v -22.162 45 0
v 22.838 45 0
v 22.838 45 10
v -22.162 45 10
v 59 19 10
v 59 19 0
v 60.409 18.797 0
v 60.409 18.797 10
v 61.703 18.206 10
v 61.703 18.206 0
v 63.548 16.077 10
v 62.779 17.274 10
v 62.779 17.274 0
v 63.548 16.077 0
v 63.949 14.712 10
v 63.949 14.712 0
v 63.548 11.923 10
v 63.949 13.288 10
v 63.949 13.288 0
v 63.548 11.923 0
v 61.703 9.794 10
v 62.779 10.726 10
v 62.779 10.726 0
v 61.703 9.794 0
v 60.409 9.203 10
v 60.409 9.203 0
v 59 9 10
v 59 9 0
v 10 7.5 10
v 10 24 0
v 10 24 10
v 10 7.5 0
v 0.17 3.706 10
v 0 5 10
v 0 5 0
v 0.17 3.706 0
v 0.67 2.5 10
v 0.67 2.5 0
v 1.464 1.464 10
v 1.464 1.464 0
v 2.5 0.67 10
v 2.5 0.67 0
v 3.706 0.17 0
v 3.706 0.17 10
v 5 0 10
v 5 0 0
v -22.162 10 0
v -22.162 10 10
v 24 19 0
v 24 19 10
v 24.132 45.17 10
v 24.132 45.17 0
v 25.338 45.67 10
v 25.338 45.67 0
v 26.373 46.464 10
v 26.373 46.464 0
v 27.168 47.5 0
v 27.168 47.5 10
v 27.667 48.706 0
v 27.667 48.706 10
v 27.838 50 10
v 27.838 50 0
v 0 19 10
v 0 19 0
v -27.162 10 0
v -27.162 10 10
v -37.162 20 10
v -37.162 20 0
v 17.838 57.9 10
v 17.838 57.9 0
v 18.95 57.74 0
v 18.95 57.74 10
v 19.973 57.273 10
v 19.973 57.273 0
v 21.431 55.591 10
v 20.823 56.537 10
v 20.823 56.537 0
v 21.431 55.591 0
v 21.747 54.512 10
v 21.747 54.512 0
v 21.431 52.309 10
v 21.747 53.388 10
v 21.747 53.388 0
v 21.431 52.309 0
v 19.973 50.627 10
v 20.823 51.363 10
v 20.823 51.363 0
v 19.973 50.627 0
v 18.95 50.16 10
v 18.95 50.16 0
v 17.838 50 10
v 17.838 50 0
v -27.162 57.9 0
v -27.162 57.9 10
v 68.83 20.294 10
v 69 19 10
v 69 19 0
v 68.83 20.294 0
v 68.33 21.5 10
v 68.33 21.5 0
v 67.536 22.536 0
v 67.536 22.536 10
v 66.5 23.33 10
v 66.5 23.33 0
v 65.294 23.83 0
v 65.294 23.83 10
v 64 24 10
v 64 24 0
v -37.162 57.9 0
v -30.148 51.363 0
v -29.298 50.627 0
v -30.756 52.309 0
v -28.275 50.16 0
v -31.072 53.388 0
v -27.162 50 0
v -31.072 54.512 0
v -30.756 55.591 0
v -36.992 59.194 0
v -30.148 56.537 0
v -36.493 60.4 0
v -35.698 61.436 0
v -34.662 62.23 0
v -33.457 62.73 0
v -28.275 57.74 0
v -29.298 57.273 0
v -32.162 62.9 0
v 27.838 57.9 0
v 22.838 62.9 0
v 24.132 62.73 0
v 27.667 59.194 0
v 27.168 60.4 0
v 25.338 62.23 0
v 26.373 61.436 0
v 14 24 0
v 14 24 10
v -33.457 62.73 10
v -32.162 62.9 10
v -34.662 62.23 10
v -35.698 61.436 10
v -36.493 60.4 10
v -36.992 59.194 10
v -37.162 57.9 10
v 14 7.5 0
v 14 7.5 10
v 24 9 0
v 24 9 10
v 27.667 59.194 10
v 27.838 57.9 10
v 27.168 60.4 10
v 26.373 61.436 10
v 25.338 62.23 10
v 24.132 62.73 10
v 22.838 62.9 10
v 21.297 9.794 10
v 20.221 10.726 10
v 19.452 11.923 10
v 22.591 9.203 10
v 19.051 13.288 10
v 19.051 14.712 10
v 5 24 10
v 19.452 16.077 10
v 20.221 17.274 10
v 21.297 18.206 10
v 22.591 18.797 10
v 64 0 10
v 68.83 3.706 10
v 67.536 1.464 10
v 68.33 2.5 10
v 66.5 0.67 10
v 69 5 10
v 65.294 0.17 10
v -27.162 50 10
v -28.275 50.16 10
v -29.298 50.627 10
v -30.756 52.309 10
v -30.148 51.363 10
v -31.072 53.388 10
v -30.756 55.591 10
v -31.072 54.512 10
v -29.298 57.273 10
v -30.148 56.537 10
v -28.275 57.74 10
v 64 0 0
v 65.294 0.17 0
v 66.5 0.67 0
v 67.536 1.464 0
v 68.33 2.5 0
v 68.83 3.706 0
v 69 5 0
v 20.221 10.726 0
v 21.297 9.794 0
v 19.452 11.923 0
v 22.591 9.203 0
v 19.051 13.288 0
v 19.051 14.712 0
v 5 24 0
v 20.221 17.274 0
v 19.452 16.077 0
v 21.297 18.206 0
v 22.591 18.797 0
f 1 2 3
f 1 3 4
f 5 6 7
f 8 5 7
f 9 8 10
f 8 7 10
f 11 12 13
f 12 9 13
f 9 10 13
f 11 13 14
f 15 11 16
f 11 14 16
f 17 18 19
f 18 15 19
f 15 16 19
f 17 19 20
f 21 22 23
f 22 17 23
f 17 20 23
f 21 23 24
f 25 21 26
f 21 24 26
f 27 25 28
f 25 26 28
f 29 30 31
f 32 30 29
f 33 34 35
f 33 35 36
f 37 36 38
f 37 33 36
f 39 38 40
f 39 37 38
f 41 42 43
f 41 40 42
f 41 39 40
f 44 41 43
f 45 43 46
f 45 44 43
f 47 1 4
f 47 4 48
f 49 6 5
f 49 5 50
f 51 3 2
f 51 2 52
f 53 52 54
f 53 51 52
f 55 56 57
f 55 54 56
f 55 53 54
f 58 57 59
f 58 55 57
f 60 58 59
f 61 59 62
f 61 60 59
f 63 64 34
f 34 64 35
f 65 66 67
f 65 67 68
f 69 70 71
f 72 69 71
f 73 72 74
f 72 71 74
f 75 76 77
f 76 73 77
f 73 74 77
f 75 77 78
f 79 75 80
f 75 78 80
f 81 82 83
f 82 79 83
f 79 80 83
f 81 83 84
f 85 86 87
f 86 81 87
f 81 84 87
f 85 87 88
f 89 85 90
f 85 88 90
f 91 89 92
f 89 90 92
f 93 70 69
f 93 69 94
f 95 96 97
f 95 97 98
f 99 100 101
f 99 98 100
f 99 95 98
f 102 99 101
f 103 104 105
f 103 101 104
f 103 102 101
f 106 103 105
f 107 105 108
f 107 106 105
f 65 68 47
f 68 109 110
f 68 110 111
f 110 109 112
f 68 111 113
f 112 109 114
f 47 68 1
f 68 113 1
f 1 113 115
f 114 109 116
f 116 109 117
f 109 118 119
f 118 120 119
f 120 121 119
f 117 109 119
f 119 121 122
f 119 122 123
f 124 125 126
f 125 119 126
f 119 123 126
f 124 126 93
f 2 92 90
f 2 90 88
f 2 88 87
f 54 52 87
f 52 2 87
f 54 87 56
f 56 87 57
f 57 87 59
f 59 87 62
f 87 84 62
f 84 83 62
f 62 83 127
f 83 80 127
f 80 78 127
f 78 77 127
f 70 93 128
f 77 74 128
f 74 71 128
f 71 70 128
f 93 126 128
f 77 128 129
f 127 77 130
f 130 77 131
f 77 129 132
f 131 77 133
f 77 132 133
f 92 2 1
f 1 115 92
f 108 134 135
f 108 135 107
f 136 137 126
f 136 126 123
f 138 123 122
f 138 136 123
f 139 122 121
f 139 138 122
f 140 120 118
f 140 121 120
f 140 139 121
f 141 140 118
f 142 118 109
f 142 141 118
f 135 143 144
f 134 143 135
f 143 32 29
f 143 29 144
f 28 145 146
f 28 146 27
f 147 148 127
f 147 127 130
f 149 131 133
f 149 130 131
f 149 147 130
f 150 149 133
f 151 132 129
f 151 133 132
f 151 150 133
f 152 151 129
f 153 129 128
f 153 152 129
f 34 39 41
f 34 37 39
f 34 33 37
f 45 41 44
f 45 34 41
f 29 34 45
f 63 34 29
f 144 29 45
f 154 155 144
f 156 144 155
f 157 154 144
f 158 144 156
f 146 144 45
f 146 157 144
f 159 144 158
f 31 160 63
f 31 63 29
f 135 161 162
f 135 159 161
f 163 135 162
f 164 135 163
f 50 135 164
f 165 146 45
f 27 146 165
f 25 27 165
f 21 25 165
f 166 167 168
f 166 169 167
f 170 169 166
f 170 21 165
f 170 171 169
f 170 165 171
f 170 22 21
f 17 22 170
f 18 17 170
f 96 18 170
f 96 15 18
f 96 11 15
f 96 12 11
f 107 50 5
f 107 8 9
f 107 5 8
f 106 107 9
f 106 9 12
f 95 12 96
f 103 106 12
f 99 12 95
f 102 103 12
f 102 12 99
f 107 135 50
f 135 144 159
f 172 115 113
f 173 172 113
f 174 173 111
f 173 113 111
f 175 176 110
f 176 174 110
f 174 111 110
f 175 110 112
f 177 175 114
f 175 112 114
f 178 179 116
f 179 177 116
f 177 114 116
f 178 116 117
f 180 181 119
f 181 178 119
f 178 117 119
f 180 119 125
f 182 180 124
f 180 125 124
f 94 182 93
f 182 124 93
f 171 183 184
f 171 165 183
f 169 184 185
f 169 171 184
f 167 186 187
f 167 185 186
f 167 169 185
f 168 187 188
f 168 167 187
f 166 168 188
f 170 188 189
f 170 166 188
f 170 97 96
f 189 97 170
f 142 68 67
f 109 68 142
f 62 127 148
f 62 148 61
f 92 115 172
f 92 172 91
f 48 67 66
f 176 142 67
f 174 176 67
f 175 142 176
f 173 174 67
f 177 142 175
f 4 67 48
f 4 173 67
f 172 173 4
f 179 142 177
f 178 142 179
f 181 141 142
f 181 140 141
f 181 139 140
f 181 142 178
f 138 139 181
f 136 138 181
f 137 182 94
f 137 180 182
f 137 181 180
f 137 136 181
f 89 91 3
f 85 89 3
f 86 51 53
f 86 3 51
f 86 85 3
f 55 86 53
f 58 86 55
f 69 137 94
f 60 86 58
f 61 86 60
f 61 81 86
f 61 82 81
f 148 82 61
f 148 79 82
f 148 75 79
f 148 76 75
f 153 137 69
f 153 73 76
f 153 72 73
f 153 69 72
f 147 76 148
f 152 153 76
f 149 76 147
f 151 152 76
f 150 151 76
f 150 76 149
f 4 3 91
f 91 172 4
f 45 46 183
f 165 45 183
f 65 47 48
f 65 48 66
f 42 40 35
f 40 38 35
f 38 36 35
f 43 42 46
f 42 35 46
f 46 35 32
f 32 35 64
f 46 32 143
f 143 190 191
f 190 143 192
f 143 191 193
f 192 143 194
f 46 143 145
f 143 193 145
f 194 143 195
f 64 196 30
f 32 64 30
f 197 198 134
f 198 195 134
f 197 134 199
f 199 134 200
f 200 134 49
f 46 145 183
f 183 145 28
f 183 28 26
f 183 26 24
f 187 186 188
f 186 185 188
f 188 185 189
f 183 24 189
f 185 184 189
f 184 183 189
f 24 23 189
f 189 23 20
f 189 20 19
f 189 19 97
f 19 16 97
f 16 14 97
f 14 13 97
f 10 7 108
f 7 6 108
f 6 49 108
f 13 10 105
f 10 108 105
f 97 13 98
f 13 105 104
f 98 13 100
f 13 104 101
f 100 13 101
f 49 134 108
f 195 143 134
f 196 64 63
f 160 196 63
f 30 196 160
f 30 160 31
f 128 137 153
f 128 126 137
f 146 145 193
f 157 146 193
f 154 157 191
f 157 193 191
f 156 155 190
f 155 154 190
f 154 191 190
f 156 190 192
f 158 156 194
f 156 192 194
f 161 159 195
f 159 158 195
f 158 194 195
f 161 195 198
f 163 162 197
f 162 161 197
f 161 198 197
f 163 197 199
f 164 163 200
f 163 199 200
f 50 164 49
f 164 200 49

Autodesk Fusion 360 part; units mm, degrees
sketch "back" plane through (0, 0, 0) normal (0, 0, 1) x (1, 0, 0)
  line L0 (-37.1625, 9.7554) -> (-37.1625, 62.9)
  line L1 (-37.1625, 62.9) -> (27.8375, 62.9)
  line L2 (27.8375, 62.9) -> (27.8375, 45)
  line L3 (27.8375, 45) -> (-22.1625, 45)
  line L4 (-22.1625, 45) -> (-22.1625, 10)
  line L5 (-22.1625, 10) -> (-37.1625, 10)
  line L6 (-37.1625, 10) -> (-37.1625, 9.7554)
  line L7 (27.8375, 53.95) -> (-37.1625, 53.95) construction
  line L8 (17.8375, 62.9) -> (17.8375, 53.95)
  line L9 (-27.1625, 62.9) -> (-27.1625, 53.95)
  line L10 (-27.1625, 50) -> (17.8375, 50)
  arc A0 (17.8375, 50) -> (17.8375, 57.9) centre (17.8375, 53.95) ccw
  line L11 (17.8375, 57.9) -> (-27.1625, 57.9)
  arc A1 (-27.1625, 57.9) -> (-27.1625, 50) centre (-27.1625, 53.95) ccw
  line L12 (-27.1625, 53.95) -> (17.8375, 53.95) construction
  line L13 (0, 0) -> (-32, 0) construction
  line L14 (0, 0) -> (0, 18) construction
  line L15 (-22.1625, 45) -> (-37.1625, 45)
  point P0 (-27.1625, 53.95)
  point P1 (17.8375, 53.95)
  dimension "d1" = 10
  dimension "d2" = 10
  dimension "d3" = 35
  dimension "d5" = 15
  dimension "d6" = 7.9
  dimension "d7" = 45
  dimension "d8" = 5
  dimension "d9" = 10
  dimension "d10" = 22.1625
extrude "Extrude1" add sketch "back" along normal blind 10 contours L0 L4 L5 L15 | L0 L1 L2 L3 L8 L9 L10 A0 A1 L15 | L1 L8 L9 L11 makes body 1
chamfer "Chamfer1" distance 10 angle 45 1 edges at (-37.1625, 10, 5) on bodies 1
fillet "Fillet1" radius 5 3 edges at (-37.1625, 62.9, 5) (27.8375, 62.9, 5) (27.8375, 45, 5) on bodies 1
sketch "front" plane through (0, 0, 0) normal (0, 0, 1) x (1, 0, 0)
  line L0 (0, 24) -> (10, 24)
  line L1 (10, 24) -> (10, 7.5)
  line L2 (10, 7.5) -> (14, 7.5)
  line L3 (14, 7.5) -> (14, 24)
  line L4 (0, 0) -> (69, 0)
  line L5 (0, 24) -> (0, 0)
  line L6 (14, 14) -> (69, 14) construction
  line L7 (24, 9) -> (59, 9)
  arc A0 (59, 9) -> (59, 19) centre (59, 14) ccw
  line L8 (59, 19) -> (24, 19)
  arc A1 (24, 19) -> (24, 9) centre (24, 14) ccw
  line L9 (24, 14) -> (59, 14) construction
  line L10 (14, 24) -> (69, 24)
  line L11 (69, 24) -> (69, 0)
  point P0 (19, 14)
  point P1 (64, 14)
  dimension "d27" = 10
  dimension "d28" = 16.5
  dimension "d35" = 4
  dimension "d55" = 7.5
  dimension "d56" = 10
  dimension "d58" = 5
  dimension "d59" = 5
  dimension "d60" = 35
  dimension "d65" = 5
extrude "Extrude4" add sketch "front" along normal blind 10 separate body makes body 2
fillet "Fillet4" radius 5 3 edges at (69, 0, 5) (0, 0, 5) (69, 24, 5) on bodies 2
chamfer "Chamfer4" distance 5 angle 45 1 edges at (0, 24, 5) on bodies 2
